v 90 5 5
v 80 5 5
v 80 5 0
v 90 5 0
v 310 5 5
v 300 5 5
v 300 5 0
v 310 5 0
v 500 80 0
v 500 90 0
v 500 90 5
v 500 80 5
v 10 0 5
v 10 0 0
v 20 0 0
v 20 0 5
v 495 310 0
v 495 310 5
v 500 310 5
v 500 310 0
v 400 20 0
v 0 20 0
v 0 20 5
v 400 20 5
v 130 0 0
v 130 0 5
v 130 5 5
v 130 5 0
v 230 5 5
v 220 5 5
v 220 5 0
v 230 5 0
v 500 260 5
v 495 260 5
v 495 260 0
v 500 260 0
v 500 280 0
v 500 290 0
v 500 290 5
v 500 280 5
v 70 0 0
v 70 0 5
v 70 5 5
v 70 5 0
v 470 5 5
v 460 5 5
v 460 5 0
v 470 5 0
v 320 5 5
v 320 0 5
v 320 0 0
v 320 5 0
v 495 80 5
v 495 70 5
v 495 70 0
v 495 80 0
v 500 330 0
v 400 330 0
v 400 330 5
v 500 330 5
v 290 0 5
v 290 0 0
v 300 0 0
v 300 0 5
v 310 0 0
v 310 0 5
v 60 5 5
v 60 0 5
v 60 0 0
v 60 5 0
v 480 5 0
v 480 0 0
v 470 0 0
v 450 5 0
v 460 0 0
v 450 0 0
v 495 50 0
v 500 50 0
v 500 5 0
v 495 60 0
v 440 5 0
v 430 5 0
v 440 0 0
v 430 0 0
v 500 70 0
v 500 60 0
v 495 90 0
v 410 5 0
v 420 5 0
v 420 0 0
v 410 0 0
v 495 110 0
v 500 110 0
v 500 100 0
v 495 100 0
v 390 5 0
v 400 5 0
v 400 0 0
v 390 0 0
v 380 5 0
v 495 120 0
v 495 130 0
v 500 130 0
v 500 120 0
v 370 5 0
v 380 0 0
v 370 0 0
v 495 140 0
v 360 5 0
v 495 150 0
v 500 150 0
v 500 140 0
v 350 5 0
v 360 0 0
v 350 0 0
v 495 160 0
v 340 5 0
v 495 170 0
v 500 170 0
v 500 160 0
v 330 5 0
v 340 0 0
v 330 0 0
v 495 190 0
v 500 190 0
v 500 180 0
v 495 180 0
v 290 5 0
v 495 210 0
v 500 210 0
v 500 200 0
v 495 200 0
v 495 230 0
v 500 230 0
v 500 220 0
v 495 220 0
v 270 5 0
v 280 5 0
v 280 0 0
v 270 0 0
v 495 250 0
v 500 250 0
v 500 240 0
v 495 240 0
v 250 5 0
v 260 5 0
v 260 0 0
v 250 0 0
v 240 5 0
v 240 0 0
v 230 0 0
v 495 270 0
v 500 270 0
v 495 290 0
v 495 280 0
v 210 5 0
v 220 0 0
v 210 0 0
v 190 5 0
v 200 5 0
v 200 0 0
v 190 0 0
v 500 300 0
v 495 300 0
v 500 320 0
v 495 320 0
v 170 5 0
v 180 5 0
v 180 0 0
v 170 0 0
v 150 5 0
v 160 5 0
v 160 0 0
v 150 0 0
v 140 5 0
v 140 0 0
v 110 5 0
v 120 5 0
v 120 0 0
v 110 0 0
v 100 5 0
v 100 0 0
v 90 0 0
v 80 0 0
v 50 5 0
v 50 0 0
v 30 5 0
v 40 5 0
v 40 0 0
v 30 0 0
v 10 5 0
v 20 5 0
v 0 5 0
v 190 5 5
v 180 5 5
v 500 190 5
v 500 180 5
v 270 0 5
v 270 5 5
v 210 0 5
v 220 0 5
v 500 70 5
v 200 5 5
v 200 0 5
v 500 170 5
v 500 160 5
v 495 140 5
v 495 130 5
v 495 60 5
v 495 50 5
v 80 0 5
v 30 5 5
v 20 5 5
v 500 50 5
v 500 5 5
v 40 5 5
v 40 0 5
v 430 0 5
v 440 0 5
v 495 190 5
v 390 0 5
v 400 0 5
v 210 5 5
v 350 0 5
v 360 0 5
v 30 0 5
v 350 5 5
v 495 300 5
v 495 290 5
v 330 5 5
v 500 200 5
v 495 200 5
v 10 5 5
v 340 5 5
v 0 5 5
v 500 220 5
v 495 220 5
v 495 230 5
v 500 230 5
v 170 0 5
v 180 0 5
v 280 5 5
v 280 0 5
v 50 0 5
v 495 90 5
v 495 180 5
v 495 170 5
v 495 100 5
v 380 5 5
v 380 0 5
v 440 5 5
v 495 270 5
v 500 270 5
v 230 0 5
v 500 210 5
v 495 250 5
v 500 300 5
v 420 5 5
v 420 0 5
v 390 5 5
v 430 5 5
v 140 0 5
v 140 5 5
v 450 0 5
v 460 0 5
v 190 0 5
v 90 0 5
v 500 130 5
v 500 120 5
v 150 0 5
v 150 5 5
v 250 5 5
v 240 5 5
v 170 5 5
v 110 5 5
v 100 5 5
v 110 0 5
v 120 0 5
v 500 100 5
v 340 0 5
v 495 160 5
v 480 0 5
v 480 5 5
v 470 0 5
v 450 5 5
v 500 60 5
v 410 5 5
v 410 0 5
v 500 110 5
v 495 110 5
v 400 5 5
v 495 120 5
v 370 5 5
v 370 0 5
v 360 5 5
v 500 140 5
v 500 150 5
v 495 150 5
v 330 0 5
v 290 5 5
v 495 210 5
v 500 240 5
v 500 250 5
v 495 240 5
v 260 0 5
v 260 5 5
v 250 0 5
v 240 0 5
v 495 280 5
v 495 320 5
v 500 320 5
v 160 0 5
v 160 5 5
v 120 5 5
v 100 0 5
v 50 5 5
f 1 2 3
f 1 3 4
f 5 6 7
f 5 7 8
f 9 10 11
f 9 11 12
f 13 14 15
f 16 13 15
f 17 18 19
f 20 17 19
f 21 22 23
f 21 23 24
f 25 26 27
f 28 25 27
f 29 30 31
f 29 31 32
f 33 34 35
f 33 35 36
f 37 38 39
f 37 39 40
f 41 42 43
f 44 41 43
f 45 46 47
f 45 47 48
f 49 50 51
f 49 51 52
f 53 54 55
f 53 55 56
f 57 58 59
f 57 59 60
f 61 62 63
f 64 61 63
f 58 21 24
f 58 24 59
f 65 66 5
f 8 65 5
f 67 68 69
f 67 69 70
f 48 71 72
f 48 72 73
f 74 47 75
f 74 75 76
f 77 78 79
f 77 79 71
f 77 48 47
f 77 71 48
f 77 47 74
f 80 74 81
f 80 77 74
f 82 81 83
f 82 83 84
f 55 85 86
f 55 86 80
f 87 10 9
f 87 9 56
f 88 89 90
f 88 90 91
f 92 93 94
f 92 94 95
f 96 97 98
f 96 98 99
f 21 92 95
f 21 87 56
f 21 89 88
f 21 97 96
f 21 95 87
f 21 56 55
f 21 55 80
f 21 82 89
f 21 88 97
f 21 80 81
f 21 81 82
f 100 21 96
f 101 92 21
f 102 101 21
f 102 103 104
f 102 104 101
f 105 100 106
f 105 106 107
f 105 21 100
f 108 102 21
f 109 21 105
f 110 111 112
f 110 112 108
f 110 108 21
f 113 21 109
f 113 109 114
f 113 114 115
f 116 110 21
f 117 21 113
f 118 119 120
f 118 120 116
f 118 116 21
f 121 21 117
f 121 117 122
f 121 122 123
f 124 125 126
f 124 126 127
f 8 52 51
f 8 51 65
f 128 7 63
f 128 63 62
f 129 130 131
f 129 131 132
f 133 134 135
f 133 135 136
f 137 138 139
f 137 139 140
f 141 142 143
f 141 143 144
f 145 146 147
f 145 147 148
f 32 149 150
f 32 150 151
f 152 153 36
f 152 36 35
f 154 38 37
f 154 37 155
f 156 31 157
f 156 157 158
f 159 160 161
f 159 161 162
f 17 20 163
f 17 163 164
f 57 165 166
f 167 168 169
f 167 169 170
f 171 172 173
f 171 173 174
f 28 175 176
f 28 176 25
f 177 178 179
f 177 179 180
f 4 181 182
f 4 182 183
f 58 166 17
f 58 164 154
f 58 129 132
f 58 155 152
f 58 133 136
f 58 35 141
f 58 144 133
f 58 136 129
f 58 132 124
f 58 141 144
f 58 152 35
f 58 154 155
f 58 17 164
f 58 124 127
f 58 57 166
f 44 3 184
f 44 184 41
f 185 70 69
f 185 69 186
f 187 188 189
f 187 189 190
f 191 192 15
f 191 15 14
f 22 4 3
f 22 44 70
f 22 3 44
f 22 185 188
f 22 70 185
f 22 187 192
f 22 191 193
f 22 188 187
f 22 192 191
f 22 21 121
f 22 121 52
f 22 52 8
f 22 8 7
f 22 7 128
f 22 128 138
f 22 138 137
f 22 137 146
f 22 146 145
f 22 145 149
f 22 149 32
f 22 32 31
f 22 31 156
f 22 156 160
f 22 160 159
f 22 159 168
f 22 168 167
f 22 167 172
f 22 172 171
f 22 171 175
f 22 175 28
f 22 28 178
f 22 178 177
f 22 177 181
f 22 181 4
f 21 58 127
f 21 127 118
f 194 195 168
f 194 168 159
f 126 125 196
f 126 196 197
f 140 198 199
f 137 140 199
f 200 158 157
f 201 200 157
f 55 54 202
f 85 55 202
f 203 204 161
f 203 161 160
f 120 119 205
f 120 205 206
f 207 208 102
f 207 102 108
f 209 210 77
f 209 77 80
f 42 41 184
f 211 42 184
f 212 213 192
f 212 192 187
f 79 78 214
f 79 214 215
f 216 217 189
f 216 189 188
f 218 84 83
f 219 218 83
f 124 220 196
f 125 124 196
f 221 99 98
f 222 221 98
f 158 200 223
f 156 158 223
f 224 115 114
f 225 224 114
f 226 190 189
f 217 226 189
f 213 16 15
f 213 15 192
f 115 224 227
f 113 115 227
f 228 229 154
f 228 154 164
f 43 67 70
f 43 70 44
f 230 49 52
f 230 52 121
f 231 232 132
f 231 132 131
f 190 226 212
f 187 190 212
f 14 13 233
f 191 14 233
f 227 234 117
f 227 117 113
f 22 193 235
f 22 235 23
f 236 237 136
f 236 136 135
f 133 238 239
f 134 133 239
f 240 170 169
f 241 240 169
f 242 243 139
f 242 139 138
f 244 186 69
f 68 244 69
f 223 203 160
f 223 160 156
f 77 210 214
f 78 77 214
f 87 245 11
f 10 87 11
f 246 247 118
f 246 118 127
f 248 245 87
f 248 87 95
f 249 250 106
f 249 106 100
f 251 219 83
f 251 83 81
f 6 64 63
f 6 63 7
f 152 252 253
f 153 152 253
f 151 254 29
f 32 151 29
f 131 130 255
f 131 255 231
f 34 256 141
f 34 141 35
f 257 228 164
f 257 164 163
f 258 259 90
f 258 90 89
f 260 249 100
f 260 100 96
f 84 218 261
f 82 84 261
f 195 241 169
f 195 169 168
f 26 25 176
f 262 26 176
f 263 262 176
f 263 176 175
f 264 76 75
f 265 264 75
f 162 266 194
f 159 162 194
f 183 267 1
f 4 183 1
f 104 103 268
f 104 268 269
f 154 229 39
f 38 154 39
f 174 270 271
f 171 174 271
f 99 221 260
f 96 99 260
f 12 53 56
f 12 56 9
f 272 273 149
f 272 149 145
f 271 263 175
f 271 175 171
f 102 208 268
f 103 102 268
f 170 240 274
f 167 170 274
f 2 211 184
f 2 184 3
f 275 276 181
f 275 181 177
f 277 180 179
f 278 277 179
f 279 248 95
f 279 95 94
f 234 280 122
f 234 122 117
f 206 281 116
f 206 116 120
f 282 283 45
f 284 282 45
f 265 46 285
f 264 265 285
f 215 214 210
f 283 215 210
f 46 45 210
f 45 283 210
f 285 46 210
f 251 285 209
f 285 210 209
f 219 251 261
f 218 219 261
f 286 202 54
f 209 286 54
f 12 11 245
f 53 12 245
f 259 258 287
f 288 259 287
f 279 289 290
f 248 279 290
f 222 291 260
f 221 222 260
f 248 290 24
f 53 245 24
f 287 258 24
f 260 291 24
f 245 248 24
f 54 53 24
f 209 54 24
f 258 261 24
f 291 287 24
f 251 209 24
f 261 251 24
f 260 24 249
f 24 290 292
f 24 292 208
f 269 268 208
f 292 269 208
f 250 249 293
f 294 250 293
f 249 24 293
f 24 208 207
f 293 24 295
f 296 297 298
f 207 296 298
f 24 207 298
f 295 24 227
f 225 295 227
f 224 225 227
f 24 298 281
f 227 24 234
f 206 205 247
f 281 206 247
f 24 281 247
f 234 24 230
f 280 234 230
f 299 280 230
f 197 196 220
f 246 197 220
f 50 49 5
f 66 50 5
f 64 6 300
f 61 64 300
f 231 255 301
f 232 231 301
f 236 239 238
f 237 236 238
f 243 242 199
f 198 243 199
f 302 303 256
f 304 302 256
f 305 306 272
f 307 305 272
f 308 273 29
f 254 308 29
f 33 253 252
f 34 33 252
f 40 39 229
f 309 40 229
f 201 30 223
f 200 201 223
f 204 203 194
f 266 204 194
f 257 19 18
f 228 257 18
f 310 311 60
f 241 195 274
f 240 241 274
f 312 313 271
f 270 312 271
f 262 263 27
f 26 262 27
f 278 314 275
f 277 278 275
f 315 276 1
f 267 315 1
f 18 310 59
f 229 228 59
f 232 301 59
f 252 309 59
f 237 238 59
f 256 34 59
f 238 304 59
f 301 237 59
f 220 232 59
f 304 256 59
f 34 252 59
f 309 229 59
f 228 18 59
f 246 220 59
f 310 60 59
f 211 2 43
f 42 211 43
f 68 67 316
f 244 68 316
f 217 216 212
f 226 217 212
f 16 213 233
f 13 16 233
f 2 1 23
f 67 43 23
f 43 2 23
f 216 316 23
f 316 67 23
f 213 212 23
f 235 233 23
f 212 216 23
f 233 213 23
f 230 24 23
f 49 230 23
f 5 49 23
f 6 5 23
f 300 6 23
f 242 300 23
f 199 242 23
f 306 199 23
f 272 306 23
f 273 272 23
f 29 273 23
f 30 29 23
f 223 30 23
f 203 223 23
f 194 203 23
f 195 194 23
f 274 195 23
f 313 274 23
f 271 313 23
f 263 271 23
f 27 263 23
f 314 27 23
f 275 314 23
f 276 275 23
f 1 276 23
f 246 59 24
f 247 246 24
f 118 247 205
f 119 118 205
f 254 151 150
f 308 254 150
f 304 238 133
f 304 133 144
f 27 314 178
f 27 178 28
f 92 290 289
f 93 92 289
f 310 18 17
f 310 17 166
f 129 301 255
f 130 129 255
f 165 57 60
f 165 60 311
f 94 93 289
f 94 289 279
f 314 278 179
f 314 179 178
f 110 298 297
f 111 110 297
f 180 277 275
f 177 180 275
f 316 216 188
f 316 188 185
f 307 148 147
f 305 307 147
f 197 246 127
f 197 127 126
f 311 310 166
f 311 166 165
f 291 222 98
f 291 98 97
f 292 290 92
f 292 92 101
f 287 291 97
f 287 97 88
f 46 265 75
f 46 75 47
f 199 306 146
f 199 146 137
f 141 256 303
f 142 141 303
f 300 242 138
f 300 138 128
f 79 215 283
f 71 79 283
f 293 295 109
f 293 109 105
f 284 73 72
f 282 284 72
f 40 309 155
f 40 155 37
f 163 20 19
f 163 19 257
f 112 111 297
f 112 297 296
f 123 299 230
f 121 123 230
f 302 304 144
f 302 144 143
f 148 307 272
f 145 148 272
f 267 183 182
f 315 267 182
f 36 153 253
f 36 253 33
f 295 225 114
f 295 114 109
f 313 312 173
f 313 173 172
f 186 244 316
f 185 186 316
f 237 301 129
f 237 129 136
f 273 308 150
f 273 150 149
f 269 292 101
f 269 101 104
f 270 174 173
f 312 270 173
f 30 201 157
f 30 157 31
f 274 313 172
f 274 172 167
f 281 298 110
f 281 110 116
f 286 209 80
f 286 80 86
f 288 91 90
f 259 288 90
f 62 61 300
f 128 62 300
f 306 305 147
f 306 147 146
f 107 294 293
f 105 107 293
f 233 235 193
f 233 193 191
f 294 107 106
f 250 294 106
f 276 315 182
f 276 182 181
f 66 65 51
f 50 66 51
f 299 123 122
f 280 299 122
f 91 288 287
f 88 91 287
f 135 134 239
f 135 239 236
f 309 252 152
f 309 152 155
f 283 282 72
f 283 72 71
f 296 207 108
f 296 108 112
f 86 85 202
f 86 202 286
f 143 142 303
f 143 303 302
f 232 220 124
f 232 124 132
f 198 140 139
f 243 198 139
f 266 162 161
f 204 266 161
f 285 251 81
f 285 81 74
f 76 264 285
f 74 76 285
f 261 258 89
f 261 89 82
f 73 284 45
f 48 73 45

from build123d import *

# Parameters (mm, degrees)
BOSS_EXTRU_1_DEPTH      = 5
ESQUISSE2_W             = 10
ESQUISSE2_H             = 5
ESQUISSE2_W_2           = 5
ESQUISSE2_H_2           = 10
ENL_V_MAT_EXTRU_2_DEPTH = 600.103496902


with BuildPart() as part:
    # Esquisse1 → Boss.-Extru.1 (new body)
    with BuildSketch(Plane.XY):
        Polygon((400, 20), (400, 330), (500, 330), (500, 0), (400, 0), (0, 0), (0, 20), align=None)
    extrude(amount=BOSS_EXTRU_1_DEPTH)

    # Esquisse2 → Enlèv. mat.-Extru.2 (cut, through all)
    with BuildSketch(Plane.XY.offset(5)):
        with Locations((25, 2.5)):
            Rectangle(ESQUISSE2_W, ESQUISSE2_H)
        with Locations((5, 2.5)):
            Rectangle(ESQUISSE2_W, ESQUISSE2_H)
        with Locations((45, 2.5)):
            Rectangle(ESQUISSE2_W, ESQUISSE2_H)
        with Locations((65, 2.5)):
            Rectangle(ESQUISSE2_W, ESQUISSE2_H)
        with Locations((85, 2.5)):
            Rectangle(ESQUISSE2_W, ESQUISSE2_H)
        with Locations((105, 2.5)):
            Rectangle(ESQUISSE2_W, ESQUISSE2_H)
        with Locations((125, 2.5)):
            Rectangle(ESQUISSE2_W, ESQUISSE2_H)
        with Locations((145, 2.5)):
            Rectangle(ESQUISSE2_W, ESQUISSE2_H)
        with Locations((165, 2.5)):
            Rectangle(ESQUISSE2_W, ESQUISSE2_H)
        with Locations((185, 2.5)):
            Rectangle(ESQUISSE2_W, ESQUISSE2_H)
        with Locations((205, 2.5)):
            Rectangle(ESQUISSE2_W, ESQUISSE2_H)
        with Locations((225, 2.5)):
            Rectangle(ESQUISSE2_W, ESQUISSE2_H)
        with Locations((245, 2.5)):
            Rectangle(ESQUISSE2_W, ESQUISSE2_H)
        with Locations((265, 2.5)):
            Rectangle(ESQUISSE2_W, ESQUISSE2_H)
        with Locations((285, 2.5)):
            Rectangle(ESQUISSE2_W, ESQUISSE2_H)
        with Locations((305, 2.5)):
            Rectangle(ESQUISSE2_W, ESQUISSE2_H)
        with Locations((325, 2.5)):
            Rectangle(ESQUISSE2_W, ESQUISSE2_H)
        with Locations((345, 2.5)):
            Rectangle(ESQUISSE2_W, ESQUISSE2_H)
        with Locations((365, 2.5)):
            Rectangle(ESQUISSE2_W, ESQUISSE2_H)
        with Locations((385, 2.5)):
            Rectangle(ESQUISSE2_W, ESQUISSE2_H)
        with Locations((405, 2.5)):
            Rectangle(ESQUISSE2_W, ESQUISSE2_H)
        with Locations((425, 2.5)):
            Rectangle(ESQUISSE2_W, ESQUISSE2_H)
        with Locations((445, 2.5)):
            Rectangle(ESQUISSE2_W, ESQUISSE2_H)
        with Locations((465, 2.5)):
            Rectangle(ESQUISSE2_W, ESQUISSE2_H)
        Polygon((480, 0), (480, 5), (490, 5), (500, 5), (500, 0), (490, 0), align=None)
        with Locations((497.5, 315)):
            Rectangle(ESQUISSE2_W_2, ESQUISSE2_H_2)
        with Locations((497.5, 295)):
            Rectangle(ESQUISSE2_W_2, ESQUISSE2_H_2)
        with Locations((497.5, 275)):
            Rectangle(ESQUISSE2_W_2, ESQUISSE2_H_2)
        with Locations((497.5, 255)):
            Rectangle(ESQUISSE2_W_2, ESQUISSE2_H_2)
        with Locations((497.5, 235)):
            Rectangle(ESQUISSE2_W_2, ESQUISSE2_H_2)
        with Locations((497.5, 215)):
            Rectangle(ESQUISSE2_W_2, ESQUISSE2_H_2)
        with Locations((497.5, 195)):
            Rectangle(ESQUISSE2_W_2, ESQUISSE2_H_2)
        with Locations((497.5, 175)):
            Rectangle(ESQUISSE2_W_2, ESQUISSE2_H_2)
        with Locations((497.5, 155)):
            Rectangle(ESQUISSE2_W_2, ESQUISSE2_H_2)
        with Locations((497.5, 135)):
            Rectangle(ESQUISSE2_W_2, ESQUISSE2_H_2)
        with Locations((497.5, 115)):
            Rectangle(ESQUISSE2_W_2, ESQUISSE2_H_2)
        with Locations((497.5, 95)):
            Rectangle(ESQUISSE2_W_2, ESQUISSE2_H_2)
        with Locations((497.5, 75)):
            Rectangle(ESQUISSE2_W_2, ESQUISSE2_H_2)
        with Locations((497.5, 55)):
            Rectangle(ESQUISSE2_W_2, ESQUISSE2_H_2)
    extrude(amount=-ENL_V_MAT_EXTRU_2_DEPTH, mode=Mode.SUBTRACT)


solid = part.part
